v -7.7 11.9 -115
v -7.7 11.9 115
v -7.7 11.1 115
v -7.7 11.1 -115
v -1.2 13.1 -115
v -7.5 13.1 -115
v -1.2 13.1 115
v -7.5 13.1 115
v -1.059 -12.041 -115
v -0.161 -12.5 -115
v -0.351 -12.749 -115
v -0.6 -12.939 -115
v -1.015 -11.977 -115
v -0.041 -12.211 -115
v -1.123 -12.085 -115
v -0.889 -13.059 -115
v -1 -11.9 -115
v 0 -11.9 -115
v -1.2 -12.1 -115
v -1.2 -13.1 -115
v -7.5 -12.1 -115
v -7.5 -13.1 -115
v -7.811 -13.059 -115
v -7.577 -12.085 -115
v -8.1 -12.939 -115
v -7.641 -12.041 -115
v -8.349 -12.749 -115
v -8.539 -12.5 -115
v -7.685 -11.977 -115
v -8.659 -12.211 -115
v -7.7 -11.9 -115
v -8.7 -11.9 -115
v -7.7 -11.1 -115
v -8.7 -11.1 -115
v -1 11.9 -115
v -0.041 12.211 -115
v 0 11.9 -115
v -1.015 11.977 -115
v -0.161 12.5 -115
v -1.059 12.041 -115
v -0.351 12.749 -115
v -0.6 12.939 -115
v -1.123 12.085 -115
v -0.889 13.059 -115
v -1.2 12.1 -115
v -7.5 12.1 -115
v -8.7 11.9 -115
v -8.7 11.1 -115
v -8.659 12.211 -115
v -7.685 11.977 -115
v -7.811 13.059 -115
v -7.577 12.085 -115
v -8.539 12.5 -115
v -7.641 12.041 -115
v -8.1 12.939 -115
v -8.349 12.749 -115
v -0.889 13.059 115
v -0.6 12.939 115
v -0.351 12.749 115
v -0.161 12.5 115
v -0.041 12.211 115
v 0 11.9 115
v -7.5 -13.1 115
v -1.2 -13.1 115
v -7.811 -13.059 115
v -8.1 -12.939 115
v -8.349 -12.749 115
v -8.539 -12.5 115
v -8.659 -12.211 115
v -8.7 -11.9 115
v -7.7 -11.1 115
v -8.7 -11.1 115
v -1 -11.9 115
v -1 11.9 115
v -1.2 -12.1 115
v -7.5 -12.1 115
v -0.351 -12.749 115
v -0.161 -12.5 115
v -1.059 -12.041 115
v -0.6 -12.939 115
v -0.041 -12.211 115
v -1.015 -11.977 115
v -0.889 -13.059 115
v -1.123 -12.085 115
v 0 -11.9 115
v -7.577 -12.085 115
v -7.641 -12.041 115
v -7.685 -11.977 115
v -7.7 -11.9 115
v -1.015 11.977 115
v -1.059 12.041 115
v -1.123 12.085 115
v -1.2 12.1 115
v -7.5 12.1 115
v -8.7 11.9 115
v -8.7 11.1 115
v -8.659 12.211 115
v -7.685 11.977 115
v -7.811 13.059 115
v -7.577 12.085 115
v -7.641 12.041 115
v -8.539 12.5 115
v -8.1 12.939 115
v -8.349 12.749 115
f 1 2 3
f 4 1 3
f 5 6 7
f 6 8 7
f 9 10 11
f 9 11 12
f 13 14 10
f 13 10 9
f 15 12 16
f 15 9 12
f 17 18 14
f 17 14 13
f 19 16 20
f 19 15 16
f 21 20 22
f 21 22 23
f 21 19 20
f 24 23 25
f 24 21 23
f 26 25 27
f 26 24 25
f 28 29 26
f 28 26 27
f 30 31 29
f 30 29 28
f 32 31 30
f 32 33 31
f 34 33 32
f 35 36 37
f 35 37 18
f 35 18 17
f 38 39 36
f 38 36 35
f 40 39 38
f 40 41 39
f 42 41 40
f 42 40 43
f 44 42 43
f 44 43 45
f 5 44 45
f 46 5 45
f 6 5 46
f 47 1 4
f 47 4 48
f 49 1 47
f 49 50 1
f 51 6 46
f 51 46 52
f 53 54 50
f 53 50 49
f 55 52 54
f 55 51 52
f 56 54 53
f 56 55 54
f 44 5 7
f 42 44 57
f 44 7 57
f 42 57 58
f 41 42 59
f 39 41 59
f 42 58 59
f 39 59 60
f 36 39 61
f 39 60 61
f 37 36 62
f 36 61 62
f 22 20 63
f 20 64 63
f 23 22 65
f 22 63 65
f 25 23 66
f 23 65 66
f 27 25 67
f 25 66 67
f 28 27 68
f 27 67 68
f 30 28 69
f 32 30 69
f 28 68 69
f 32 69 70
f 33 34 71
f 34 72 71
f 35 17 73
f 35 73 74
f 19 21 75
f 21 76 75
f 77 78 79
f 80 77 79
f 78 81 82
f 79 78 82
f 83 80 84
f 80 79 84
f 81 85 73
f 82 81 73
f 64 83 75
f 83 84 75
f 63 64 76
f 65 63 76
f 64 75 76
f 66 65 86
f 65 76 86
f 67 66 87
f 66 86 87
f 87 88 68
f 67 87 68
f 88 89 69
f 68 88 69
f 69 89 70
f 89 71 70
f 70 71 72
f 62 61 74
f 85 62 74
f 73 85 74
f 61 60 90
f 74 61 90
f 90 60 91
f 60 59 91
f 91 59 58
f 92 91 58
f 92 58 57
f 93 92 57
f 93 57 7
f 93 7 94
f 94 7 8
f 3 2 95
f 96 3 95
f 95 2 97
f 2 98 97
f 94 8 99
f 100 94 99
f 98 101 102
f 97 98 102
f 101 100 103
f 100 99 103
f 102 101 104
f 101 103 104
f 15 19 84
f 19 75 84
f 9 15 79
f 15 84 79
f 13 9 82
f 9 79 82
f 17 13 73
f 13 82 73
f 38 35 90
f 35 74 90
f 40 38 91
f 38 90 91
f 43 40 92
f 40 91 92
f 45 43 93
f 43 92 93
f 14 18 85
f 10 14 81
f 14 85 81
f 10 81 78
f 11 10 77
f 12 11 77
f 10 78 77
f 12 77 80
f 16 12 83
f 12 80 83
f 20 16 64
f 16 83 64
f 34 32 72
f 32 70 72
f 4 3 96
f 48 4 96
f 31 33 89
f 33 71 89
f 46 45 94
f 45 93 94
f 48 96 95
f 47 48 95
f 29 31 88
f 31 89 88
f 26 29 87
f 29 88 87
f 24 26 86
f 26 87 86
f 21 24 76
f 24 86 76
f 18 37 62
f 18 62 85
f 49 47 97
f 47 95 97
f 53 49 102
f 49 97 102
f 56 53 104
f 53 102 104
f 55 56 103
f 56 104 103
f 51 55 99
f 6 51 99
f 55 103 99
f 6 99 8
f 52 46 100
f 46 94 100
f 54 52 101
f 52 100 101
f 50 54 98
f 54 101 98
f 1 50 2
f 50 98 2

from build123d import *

# Parameters (mm, degrees)
SM_BASE_FLANGE_1_DEPTH = 115


# Sheet-metal steps are written as plain solids
with BuildPart() as part:
    # Sketch 1 → Базовая кромка1 (new, symmetric)
    with BuildSketch(Plane.XY):
        with BuildLine():
            Line((-8.7, 11.1), (-8.7, 11.9))
            ThreePointArc((-8.7, 11.9), (-8.348528137, 12.748528137), (-7.5, 13.1))
            Line((-7.5, 13.1), (-1.2, 13.1))
            ThreePointArc((-1.2, 13.1), (-0.351471863, 12.748528137), (0, 11.9))
            Line((0, 11.9), (0, -11.9))
            ThreePointArc((0, -11.9), (-0.351471863, -12.748528137), (-1.2, -13.1))
            Line((-1.2, -13.1), (-7.5, -13.1))
            ThreePointArc((-7.5, -13.1), (-8.348528137, -12.748528137), (-8.7, -11.9))
            Line((-8.7, -11.9), (-8.7, -11.1))
            Line((-8.7, -11.1), (-7.7, -11.1))
            Line((-7.7, -11.1), (-7.7, -11.9))
            ThreePointArc((-7.7, -11.9), (-7.641421356, -12.041421356), (-7.5, -12.1))
            Line((-7.5, -12.1), (-1.2, -12.1))
            ThreePointArc((-1.2, -12.1), (-1.058578644, -12.041421356), (-1, -11.9))
            Line((-1, -11.9), (-1, 11.9))
            ThreePointArc((-1, 11.9), (-1.058578644, 12.041421356), (-1.2, 12.1))
            Line((-1.2, 12.1), (-7.5, 12.1))
            ThreePointArc((-7.5, 12.1), (-7.641421356, 12.041421356), (-7.7, 11.9))
            Line((-7.7, 11.9), (-7.7, 11.1))
            Line((-7.7, 11.1), (-8.7, 11.1))
        make_face()
    extrude(amount=SM_BASE_FLANGE_1_DEPTH, both=True)


solid = part.part
